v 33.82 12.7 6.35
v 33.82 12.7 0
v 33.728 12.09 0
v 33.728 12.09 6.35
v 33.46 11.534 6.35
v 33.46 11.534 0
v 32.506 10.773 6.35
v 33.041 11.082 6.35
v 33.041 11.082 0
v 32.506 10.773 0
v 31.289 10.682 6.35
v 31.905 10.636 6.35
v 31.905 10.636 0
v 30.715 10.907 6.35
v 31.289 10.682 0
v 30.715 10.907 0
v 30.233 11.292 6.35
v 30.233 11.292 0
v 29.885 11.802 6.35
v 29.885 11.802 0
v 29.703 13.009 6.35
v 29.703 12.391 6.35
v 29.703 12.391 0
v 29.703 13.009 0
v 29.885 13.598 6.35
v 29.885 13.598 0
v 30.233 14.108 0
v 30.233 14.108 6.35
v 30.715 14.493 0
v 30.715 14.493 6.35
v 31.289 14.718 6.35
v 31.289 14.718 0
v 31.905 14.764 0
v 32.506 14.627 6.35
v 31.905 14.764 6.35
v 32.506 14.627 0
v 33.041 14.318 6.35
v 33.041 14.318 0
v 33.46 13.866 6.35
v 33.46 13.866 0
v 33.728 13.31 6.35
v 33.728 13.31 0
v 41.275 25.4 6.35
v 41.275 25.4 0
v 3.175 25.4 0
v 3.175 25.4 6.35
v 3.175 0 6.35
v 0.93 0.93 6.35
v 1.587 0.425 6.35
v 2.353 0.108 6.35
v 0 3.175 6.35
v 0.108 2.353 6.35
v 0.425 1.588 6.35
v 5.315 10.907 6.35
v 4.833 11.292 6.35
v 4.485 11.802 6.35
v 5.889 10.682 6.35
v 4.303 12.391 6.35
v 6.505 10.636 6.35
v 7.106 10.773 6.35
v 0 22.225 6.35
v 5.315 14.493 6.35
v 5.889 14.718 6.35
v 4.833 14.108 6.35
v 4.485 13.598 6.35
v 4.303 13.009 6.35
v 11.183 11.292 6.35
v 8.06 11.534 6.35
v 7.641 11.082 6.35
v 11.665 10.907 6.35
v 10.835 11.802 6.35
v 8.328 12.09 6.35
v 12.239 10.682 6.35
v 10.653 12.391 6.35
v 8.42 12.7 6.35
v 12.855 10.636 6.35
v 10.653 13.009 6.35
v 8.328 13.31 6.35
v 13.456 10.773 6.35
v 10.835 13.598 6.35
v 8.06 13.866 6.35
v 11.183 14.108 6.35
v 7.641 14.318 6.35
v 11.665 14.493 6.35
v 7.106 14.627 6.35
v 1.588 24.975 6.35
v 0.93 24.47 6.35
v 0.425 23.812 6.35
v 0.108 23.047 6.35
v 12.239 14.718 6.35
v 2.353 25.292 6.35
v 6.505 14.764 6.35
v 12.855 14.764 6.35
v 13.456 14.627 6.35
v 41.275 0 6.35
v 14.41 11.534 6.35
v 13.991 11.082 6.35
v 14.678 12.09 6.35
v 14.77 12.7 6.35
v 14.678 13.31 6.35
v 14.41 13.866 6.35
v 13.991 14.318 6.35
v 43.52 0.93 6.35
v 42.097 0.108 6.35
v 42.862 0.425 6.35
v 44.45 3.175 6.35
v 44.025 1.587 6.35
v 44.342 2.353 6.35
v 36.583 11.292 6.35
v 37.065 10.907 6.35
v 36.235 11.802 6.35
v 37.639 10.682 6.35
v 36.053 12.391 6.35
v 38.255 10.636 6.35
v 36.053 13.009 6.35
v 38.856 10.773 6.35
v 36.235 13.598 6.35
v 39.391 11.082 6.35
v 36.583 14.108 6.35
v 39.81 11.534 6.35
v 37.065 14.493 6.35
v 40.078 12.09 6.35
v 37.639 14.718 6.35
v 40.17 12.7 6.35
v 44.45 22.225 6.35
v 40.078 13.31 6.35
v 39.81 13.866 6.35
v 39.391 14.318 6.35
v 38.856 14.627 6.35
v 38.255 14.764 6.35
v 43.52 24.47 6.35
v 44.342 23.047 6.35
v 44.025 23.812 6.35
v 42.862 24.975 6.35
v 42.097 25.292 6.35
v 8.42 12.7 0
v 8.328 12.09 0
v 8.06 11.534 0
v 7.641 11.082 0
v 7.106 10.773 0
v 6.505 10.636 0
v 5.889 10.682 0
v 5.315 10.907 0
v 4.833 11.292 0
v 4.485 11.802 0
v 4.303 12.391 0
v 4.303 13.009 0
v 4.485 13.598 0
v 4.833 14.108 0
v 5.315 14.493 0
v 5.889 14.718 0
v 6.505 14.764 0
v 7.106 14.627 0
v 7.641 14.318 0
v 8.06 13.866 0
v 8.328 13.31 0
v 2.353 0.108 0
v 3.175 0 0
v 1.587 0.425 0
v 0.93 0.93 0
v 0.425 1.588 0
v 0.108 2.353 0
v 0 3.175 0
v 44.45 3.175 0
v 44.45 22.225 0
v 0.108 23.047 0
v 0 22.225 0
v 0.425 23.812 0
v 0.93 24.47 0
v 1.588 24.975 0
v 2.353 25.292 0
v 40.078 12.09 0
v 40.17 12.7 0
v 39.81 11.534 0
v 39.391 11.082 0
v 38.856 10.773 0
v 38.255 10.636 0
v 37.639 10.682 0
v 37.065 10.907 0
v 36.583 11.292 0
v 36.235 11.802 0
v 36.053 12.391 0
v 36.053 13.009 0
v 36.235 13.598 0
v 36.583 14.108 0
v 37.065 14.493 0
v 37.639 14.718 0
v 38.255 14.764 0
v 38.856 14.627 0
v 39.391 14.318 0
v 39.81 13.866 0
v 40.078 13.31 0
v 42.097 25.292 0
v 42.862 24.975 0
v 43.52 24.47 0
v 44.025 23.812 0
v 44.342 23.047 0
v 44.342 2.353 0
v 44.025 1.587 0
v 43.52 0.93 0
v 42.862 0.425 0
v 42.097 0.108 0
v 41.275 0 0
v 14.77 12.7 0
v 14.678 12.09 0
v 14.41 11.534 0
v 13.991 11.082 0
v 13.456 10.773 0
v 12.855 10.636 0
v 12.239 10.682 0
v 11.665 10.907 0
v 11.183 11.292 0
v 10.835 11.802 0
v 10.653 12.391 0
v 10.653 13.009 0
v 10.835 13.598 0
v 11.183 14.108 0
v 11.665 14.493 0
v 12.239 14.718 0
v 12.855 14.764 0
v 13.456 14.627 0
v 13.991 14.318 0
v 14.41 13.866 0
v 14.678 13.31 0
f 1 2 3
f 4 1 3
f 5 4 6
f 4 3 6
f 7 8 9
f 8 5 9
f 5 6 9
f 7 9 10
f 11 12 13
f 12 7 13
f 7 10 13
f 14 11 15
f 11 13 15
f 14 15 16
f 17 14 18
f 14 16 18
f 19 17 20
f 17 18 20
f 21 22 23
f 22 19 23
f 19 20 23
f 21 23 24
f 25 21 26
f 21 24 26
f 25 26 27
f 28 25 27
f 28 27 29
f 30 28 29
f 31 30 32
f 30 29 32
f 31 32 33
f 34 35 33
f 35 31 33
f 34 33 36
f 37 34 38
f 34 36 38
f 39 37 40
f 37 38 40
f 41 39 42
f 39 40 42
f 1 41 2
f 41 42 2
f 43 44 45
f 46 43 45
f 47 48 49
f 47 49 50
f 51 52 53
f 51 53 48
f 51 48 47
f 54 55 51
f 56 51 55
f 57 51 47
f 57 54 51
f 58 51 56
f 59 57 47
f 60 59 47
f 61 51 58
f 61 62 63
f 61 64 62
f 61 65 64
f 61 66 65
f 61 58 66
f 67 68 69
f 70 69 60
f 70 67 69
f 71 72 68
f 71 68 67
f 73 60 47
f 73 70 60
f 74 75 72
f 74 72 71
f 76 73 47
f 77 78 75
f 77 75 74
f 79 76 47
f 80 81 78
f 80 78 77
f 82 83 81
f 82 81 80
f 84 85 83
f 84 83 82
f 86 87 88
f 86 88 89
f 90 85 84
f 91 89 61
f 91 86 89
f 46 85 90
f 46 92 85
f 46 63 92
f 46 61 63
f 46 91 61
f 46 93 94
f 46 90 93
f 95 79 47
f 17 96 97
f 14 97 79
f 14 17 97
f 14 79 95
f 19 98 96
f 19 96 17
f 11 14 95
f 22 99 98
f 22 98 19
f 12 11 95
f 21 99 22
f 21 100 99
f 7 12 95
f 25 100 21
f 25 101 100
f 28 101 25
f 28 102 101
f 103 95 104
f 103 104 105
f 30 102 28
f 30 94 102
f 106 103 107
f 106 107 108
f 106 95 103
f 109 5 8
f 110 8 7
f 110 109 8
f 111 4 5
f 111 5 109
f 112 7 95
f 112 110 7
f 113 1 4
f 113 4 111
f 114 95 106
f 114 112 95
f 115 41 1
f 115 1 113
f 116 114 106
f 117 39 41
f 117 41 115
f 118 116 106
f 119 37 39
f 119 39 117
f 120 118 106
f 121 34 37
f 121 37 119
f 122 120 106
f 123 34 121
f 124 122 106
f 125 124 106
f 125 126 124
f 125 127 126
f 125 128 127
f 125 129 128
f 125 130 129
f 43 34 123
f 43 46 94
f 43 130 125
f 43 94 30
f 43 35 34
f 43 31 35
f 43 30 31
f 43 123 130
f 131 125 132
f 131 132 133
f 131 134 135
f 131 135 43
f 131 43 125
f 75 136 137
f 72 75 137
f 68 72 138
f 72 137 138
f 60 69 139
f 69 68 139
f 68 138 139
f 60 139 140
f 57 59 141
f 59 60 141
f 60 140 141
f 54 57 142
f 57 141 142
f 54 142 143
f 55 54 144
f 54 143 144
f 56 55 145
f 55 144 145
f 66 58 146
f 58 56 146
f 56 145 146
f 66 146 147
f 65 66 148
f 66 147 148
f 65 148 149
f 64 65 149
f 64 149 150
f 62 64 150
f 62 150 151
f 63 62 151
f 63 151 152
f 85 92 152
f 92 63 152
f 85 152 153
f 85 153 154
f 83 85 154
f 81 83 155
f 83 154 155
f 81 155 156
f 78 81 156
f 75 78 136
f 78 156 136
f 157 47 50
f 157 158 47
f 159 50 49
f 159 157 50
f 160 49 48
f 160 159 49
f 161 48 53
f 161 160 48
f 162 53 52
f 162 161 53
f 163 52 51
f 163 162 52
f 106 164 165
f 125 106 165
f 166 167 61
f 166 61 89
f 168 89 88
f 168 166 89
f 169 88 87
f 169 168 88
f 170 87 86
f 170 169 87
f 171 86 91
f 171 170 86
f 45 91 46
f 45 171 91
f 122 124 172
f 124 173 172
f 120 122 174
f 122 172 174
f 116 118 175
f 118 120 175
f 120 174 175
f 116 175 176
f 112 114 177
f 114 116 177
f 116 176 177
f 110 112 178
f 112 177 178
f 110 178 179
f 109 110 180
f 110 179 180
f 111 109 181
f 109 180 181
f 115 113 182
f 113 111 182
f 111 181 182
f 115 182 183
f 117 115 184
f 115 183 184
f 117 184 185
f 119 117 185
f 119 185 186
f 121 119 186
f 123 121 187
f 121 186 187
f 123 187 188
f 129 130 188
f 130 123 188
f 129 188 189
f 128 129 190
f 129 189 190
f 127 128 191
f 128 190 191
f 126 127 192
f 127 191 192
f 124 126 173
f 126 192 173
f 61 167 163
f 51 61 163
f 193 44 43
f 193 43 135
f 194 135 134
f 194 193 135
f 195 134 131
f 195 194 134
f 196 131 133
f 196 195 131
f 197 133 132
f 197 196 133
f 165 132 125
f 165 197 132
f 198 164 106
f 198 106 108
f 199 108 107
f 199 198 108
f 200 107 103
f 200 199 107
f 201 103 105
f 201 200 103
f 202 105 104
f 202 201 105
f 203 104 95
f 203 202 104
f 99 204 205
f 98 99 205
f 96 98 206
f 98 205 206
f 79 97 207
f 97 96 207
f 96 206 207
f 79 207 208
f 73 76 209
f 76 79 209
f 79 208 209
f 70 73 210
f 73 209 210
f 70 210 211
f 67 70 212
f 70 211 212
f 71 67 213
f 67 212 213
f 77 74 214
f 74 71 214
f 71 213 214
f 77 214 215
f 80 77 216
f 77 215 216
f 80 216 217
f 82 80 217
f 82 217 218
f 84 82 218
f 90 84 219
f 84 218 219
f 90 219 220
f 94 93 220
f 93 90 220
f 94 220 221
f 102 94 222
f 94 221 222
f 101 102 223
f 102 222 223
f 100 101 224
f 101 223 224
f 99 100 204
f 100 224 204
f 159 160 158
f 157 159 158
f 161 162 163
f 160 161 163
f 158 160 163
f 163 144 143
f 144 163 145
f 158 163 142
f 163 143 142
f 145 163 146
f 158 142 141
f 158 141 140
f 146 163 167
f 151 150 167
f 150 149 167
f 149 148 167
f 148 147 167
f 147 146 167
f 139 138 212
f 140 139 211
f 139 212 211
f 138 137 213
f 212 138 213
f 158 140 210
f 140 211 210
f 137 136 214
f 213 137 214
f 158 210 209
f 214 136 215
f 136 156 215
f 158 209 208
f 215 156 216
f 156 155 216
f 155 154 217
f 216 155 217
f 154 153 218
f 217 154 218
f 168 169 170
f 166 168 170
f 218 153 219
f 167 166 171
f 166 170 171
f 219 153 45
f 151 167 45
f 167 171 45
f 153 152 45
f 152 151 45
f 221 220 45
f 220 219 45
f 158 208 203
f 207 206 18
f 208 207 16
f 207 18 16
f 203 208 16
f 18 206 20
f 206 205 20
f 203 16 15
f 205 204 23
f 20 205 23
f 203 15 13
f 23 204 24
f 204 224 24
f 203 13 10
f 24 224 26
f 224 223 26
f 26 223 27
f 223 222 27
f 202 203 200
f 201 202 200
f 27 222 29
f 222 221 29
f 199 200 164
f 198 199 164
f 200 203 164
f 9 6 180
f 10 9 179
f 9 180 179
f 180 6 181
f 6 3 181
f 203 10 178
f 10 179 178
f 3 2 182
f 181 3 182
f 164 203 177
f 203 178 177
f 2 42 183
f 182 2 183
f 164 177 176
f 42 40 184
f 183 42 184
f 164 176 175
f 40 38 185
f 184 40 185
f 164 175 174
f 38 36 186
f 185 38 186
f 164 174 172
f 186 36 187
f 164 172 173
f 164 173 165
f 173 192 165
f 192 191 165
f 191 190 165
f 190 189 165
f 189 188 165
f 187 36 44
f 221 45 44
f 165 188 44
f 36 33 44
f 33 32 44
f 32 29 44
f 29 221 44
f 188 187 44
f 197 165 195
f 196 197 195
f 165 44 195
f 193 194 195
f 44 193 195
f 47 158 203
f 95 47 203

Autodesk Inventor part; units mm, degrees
ref_plane "YZ Plane" through (0, 0, 0) normal (1, 0, 0) x (0, 1, 0)
ref_plane "XZ Plane" through (0, 0, 0) normal (0, 1, 0) x (-1, 0, 0)
ref_plane "XY Plane" through (0, 0, 0) normal (0, 0, 1) x (1, 0, 0)
sketch "Sketch1" plane through (0, 0, 0) normal (0, 0, 1) x (1, 0, 0)
  line L0 (3.175, 0) -> (41.275, 0)
  line L1 (44.45, 3.175) -> (44.45, 22.225)
  line L2 (41.275, 25.4) -> (3.175, 25.4)
  line L3 (0, 22.225) -> (0, 3.175)
  circle A0 centre (6.35, 12.7) radius 2.0701
  circle A1 centre (31.75, 12.7) radius 2.0701
  arc A2 (3.175, 25.4) -> (0, 22.225) centre (3.175, 22.225) ccw
  arc A3 (44.45, 22.225) -> (41.275, 25.4) centre (41.275, 22.225) ccw
  arc A4 (41.275, 0) -> (44.45, 3.175) centre (41.275, 3.175) ccw
  arc A5 (0, 3.175) -> (3.175, 0) centre (3.175, 3.175) ccw
  circle A6 centre (12.7, 12.7) radius 2.0701
  circle A7 centre (38.1, 12.7) radius 2.0701
  point P0 (0, 0)
  point P1 (44.45, 25.4)
  point P2 (44.45, 0)
  point P3 (0, 25.4)
  dimension "d0" = 44.45
  dimension "d1" = 25.4
  dimension "d2" = 4.1402
  dimension "d3" = 12.7
  dimension "d4" = 6.35
  dimension "d7" = 25.4
  dimension "d21" = 3.175
  dimension "d25" = 4.1402
  dimension "d26" = 12.7
  dimension "d27" = 6.35
  dimension "d30" = 25.4
extrude "Extrusion1" add sketch "Sketch1" along normal blind 6.35
properties part number "Spacer 3" material "Aluminum 6061"
